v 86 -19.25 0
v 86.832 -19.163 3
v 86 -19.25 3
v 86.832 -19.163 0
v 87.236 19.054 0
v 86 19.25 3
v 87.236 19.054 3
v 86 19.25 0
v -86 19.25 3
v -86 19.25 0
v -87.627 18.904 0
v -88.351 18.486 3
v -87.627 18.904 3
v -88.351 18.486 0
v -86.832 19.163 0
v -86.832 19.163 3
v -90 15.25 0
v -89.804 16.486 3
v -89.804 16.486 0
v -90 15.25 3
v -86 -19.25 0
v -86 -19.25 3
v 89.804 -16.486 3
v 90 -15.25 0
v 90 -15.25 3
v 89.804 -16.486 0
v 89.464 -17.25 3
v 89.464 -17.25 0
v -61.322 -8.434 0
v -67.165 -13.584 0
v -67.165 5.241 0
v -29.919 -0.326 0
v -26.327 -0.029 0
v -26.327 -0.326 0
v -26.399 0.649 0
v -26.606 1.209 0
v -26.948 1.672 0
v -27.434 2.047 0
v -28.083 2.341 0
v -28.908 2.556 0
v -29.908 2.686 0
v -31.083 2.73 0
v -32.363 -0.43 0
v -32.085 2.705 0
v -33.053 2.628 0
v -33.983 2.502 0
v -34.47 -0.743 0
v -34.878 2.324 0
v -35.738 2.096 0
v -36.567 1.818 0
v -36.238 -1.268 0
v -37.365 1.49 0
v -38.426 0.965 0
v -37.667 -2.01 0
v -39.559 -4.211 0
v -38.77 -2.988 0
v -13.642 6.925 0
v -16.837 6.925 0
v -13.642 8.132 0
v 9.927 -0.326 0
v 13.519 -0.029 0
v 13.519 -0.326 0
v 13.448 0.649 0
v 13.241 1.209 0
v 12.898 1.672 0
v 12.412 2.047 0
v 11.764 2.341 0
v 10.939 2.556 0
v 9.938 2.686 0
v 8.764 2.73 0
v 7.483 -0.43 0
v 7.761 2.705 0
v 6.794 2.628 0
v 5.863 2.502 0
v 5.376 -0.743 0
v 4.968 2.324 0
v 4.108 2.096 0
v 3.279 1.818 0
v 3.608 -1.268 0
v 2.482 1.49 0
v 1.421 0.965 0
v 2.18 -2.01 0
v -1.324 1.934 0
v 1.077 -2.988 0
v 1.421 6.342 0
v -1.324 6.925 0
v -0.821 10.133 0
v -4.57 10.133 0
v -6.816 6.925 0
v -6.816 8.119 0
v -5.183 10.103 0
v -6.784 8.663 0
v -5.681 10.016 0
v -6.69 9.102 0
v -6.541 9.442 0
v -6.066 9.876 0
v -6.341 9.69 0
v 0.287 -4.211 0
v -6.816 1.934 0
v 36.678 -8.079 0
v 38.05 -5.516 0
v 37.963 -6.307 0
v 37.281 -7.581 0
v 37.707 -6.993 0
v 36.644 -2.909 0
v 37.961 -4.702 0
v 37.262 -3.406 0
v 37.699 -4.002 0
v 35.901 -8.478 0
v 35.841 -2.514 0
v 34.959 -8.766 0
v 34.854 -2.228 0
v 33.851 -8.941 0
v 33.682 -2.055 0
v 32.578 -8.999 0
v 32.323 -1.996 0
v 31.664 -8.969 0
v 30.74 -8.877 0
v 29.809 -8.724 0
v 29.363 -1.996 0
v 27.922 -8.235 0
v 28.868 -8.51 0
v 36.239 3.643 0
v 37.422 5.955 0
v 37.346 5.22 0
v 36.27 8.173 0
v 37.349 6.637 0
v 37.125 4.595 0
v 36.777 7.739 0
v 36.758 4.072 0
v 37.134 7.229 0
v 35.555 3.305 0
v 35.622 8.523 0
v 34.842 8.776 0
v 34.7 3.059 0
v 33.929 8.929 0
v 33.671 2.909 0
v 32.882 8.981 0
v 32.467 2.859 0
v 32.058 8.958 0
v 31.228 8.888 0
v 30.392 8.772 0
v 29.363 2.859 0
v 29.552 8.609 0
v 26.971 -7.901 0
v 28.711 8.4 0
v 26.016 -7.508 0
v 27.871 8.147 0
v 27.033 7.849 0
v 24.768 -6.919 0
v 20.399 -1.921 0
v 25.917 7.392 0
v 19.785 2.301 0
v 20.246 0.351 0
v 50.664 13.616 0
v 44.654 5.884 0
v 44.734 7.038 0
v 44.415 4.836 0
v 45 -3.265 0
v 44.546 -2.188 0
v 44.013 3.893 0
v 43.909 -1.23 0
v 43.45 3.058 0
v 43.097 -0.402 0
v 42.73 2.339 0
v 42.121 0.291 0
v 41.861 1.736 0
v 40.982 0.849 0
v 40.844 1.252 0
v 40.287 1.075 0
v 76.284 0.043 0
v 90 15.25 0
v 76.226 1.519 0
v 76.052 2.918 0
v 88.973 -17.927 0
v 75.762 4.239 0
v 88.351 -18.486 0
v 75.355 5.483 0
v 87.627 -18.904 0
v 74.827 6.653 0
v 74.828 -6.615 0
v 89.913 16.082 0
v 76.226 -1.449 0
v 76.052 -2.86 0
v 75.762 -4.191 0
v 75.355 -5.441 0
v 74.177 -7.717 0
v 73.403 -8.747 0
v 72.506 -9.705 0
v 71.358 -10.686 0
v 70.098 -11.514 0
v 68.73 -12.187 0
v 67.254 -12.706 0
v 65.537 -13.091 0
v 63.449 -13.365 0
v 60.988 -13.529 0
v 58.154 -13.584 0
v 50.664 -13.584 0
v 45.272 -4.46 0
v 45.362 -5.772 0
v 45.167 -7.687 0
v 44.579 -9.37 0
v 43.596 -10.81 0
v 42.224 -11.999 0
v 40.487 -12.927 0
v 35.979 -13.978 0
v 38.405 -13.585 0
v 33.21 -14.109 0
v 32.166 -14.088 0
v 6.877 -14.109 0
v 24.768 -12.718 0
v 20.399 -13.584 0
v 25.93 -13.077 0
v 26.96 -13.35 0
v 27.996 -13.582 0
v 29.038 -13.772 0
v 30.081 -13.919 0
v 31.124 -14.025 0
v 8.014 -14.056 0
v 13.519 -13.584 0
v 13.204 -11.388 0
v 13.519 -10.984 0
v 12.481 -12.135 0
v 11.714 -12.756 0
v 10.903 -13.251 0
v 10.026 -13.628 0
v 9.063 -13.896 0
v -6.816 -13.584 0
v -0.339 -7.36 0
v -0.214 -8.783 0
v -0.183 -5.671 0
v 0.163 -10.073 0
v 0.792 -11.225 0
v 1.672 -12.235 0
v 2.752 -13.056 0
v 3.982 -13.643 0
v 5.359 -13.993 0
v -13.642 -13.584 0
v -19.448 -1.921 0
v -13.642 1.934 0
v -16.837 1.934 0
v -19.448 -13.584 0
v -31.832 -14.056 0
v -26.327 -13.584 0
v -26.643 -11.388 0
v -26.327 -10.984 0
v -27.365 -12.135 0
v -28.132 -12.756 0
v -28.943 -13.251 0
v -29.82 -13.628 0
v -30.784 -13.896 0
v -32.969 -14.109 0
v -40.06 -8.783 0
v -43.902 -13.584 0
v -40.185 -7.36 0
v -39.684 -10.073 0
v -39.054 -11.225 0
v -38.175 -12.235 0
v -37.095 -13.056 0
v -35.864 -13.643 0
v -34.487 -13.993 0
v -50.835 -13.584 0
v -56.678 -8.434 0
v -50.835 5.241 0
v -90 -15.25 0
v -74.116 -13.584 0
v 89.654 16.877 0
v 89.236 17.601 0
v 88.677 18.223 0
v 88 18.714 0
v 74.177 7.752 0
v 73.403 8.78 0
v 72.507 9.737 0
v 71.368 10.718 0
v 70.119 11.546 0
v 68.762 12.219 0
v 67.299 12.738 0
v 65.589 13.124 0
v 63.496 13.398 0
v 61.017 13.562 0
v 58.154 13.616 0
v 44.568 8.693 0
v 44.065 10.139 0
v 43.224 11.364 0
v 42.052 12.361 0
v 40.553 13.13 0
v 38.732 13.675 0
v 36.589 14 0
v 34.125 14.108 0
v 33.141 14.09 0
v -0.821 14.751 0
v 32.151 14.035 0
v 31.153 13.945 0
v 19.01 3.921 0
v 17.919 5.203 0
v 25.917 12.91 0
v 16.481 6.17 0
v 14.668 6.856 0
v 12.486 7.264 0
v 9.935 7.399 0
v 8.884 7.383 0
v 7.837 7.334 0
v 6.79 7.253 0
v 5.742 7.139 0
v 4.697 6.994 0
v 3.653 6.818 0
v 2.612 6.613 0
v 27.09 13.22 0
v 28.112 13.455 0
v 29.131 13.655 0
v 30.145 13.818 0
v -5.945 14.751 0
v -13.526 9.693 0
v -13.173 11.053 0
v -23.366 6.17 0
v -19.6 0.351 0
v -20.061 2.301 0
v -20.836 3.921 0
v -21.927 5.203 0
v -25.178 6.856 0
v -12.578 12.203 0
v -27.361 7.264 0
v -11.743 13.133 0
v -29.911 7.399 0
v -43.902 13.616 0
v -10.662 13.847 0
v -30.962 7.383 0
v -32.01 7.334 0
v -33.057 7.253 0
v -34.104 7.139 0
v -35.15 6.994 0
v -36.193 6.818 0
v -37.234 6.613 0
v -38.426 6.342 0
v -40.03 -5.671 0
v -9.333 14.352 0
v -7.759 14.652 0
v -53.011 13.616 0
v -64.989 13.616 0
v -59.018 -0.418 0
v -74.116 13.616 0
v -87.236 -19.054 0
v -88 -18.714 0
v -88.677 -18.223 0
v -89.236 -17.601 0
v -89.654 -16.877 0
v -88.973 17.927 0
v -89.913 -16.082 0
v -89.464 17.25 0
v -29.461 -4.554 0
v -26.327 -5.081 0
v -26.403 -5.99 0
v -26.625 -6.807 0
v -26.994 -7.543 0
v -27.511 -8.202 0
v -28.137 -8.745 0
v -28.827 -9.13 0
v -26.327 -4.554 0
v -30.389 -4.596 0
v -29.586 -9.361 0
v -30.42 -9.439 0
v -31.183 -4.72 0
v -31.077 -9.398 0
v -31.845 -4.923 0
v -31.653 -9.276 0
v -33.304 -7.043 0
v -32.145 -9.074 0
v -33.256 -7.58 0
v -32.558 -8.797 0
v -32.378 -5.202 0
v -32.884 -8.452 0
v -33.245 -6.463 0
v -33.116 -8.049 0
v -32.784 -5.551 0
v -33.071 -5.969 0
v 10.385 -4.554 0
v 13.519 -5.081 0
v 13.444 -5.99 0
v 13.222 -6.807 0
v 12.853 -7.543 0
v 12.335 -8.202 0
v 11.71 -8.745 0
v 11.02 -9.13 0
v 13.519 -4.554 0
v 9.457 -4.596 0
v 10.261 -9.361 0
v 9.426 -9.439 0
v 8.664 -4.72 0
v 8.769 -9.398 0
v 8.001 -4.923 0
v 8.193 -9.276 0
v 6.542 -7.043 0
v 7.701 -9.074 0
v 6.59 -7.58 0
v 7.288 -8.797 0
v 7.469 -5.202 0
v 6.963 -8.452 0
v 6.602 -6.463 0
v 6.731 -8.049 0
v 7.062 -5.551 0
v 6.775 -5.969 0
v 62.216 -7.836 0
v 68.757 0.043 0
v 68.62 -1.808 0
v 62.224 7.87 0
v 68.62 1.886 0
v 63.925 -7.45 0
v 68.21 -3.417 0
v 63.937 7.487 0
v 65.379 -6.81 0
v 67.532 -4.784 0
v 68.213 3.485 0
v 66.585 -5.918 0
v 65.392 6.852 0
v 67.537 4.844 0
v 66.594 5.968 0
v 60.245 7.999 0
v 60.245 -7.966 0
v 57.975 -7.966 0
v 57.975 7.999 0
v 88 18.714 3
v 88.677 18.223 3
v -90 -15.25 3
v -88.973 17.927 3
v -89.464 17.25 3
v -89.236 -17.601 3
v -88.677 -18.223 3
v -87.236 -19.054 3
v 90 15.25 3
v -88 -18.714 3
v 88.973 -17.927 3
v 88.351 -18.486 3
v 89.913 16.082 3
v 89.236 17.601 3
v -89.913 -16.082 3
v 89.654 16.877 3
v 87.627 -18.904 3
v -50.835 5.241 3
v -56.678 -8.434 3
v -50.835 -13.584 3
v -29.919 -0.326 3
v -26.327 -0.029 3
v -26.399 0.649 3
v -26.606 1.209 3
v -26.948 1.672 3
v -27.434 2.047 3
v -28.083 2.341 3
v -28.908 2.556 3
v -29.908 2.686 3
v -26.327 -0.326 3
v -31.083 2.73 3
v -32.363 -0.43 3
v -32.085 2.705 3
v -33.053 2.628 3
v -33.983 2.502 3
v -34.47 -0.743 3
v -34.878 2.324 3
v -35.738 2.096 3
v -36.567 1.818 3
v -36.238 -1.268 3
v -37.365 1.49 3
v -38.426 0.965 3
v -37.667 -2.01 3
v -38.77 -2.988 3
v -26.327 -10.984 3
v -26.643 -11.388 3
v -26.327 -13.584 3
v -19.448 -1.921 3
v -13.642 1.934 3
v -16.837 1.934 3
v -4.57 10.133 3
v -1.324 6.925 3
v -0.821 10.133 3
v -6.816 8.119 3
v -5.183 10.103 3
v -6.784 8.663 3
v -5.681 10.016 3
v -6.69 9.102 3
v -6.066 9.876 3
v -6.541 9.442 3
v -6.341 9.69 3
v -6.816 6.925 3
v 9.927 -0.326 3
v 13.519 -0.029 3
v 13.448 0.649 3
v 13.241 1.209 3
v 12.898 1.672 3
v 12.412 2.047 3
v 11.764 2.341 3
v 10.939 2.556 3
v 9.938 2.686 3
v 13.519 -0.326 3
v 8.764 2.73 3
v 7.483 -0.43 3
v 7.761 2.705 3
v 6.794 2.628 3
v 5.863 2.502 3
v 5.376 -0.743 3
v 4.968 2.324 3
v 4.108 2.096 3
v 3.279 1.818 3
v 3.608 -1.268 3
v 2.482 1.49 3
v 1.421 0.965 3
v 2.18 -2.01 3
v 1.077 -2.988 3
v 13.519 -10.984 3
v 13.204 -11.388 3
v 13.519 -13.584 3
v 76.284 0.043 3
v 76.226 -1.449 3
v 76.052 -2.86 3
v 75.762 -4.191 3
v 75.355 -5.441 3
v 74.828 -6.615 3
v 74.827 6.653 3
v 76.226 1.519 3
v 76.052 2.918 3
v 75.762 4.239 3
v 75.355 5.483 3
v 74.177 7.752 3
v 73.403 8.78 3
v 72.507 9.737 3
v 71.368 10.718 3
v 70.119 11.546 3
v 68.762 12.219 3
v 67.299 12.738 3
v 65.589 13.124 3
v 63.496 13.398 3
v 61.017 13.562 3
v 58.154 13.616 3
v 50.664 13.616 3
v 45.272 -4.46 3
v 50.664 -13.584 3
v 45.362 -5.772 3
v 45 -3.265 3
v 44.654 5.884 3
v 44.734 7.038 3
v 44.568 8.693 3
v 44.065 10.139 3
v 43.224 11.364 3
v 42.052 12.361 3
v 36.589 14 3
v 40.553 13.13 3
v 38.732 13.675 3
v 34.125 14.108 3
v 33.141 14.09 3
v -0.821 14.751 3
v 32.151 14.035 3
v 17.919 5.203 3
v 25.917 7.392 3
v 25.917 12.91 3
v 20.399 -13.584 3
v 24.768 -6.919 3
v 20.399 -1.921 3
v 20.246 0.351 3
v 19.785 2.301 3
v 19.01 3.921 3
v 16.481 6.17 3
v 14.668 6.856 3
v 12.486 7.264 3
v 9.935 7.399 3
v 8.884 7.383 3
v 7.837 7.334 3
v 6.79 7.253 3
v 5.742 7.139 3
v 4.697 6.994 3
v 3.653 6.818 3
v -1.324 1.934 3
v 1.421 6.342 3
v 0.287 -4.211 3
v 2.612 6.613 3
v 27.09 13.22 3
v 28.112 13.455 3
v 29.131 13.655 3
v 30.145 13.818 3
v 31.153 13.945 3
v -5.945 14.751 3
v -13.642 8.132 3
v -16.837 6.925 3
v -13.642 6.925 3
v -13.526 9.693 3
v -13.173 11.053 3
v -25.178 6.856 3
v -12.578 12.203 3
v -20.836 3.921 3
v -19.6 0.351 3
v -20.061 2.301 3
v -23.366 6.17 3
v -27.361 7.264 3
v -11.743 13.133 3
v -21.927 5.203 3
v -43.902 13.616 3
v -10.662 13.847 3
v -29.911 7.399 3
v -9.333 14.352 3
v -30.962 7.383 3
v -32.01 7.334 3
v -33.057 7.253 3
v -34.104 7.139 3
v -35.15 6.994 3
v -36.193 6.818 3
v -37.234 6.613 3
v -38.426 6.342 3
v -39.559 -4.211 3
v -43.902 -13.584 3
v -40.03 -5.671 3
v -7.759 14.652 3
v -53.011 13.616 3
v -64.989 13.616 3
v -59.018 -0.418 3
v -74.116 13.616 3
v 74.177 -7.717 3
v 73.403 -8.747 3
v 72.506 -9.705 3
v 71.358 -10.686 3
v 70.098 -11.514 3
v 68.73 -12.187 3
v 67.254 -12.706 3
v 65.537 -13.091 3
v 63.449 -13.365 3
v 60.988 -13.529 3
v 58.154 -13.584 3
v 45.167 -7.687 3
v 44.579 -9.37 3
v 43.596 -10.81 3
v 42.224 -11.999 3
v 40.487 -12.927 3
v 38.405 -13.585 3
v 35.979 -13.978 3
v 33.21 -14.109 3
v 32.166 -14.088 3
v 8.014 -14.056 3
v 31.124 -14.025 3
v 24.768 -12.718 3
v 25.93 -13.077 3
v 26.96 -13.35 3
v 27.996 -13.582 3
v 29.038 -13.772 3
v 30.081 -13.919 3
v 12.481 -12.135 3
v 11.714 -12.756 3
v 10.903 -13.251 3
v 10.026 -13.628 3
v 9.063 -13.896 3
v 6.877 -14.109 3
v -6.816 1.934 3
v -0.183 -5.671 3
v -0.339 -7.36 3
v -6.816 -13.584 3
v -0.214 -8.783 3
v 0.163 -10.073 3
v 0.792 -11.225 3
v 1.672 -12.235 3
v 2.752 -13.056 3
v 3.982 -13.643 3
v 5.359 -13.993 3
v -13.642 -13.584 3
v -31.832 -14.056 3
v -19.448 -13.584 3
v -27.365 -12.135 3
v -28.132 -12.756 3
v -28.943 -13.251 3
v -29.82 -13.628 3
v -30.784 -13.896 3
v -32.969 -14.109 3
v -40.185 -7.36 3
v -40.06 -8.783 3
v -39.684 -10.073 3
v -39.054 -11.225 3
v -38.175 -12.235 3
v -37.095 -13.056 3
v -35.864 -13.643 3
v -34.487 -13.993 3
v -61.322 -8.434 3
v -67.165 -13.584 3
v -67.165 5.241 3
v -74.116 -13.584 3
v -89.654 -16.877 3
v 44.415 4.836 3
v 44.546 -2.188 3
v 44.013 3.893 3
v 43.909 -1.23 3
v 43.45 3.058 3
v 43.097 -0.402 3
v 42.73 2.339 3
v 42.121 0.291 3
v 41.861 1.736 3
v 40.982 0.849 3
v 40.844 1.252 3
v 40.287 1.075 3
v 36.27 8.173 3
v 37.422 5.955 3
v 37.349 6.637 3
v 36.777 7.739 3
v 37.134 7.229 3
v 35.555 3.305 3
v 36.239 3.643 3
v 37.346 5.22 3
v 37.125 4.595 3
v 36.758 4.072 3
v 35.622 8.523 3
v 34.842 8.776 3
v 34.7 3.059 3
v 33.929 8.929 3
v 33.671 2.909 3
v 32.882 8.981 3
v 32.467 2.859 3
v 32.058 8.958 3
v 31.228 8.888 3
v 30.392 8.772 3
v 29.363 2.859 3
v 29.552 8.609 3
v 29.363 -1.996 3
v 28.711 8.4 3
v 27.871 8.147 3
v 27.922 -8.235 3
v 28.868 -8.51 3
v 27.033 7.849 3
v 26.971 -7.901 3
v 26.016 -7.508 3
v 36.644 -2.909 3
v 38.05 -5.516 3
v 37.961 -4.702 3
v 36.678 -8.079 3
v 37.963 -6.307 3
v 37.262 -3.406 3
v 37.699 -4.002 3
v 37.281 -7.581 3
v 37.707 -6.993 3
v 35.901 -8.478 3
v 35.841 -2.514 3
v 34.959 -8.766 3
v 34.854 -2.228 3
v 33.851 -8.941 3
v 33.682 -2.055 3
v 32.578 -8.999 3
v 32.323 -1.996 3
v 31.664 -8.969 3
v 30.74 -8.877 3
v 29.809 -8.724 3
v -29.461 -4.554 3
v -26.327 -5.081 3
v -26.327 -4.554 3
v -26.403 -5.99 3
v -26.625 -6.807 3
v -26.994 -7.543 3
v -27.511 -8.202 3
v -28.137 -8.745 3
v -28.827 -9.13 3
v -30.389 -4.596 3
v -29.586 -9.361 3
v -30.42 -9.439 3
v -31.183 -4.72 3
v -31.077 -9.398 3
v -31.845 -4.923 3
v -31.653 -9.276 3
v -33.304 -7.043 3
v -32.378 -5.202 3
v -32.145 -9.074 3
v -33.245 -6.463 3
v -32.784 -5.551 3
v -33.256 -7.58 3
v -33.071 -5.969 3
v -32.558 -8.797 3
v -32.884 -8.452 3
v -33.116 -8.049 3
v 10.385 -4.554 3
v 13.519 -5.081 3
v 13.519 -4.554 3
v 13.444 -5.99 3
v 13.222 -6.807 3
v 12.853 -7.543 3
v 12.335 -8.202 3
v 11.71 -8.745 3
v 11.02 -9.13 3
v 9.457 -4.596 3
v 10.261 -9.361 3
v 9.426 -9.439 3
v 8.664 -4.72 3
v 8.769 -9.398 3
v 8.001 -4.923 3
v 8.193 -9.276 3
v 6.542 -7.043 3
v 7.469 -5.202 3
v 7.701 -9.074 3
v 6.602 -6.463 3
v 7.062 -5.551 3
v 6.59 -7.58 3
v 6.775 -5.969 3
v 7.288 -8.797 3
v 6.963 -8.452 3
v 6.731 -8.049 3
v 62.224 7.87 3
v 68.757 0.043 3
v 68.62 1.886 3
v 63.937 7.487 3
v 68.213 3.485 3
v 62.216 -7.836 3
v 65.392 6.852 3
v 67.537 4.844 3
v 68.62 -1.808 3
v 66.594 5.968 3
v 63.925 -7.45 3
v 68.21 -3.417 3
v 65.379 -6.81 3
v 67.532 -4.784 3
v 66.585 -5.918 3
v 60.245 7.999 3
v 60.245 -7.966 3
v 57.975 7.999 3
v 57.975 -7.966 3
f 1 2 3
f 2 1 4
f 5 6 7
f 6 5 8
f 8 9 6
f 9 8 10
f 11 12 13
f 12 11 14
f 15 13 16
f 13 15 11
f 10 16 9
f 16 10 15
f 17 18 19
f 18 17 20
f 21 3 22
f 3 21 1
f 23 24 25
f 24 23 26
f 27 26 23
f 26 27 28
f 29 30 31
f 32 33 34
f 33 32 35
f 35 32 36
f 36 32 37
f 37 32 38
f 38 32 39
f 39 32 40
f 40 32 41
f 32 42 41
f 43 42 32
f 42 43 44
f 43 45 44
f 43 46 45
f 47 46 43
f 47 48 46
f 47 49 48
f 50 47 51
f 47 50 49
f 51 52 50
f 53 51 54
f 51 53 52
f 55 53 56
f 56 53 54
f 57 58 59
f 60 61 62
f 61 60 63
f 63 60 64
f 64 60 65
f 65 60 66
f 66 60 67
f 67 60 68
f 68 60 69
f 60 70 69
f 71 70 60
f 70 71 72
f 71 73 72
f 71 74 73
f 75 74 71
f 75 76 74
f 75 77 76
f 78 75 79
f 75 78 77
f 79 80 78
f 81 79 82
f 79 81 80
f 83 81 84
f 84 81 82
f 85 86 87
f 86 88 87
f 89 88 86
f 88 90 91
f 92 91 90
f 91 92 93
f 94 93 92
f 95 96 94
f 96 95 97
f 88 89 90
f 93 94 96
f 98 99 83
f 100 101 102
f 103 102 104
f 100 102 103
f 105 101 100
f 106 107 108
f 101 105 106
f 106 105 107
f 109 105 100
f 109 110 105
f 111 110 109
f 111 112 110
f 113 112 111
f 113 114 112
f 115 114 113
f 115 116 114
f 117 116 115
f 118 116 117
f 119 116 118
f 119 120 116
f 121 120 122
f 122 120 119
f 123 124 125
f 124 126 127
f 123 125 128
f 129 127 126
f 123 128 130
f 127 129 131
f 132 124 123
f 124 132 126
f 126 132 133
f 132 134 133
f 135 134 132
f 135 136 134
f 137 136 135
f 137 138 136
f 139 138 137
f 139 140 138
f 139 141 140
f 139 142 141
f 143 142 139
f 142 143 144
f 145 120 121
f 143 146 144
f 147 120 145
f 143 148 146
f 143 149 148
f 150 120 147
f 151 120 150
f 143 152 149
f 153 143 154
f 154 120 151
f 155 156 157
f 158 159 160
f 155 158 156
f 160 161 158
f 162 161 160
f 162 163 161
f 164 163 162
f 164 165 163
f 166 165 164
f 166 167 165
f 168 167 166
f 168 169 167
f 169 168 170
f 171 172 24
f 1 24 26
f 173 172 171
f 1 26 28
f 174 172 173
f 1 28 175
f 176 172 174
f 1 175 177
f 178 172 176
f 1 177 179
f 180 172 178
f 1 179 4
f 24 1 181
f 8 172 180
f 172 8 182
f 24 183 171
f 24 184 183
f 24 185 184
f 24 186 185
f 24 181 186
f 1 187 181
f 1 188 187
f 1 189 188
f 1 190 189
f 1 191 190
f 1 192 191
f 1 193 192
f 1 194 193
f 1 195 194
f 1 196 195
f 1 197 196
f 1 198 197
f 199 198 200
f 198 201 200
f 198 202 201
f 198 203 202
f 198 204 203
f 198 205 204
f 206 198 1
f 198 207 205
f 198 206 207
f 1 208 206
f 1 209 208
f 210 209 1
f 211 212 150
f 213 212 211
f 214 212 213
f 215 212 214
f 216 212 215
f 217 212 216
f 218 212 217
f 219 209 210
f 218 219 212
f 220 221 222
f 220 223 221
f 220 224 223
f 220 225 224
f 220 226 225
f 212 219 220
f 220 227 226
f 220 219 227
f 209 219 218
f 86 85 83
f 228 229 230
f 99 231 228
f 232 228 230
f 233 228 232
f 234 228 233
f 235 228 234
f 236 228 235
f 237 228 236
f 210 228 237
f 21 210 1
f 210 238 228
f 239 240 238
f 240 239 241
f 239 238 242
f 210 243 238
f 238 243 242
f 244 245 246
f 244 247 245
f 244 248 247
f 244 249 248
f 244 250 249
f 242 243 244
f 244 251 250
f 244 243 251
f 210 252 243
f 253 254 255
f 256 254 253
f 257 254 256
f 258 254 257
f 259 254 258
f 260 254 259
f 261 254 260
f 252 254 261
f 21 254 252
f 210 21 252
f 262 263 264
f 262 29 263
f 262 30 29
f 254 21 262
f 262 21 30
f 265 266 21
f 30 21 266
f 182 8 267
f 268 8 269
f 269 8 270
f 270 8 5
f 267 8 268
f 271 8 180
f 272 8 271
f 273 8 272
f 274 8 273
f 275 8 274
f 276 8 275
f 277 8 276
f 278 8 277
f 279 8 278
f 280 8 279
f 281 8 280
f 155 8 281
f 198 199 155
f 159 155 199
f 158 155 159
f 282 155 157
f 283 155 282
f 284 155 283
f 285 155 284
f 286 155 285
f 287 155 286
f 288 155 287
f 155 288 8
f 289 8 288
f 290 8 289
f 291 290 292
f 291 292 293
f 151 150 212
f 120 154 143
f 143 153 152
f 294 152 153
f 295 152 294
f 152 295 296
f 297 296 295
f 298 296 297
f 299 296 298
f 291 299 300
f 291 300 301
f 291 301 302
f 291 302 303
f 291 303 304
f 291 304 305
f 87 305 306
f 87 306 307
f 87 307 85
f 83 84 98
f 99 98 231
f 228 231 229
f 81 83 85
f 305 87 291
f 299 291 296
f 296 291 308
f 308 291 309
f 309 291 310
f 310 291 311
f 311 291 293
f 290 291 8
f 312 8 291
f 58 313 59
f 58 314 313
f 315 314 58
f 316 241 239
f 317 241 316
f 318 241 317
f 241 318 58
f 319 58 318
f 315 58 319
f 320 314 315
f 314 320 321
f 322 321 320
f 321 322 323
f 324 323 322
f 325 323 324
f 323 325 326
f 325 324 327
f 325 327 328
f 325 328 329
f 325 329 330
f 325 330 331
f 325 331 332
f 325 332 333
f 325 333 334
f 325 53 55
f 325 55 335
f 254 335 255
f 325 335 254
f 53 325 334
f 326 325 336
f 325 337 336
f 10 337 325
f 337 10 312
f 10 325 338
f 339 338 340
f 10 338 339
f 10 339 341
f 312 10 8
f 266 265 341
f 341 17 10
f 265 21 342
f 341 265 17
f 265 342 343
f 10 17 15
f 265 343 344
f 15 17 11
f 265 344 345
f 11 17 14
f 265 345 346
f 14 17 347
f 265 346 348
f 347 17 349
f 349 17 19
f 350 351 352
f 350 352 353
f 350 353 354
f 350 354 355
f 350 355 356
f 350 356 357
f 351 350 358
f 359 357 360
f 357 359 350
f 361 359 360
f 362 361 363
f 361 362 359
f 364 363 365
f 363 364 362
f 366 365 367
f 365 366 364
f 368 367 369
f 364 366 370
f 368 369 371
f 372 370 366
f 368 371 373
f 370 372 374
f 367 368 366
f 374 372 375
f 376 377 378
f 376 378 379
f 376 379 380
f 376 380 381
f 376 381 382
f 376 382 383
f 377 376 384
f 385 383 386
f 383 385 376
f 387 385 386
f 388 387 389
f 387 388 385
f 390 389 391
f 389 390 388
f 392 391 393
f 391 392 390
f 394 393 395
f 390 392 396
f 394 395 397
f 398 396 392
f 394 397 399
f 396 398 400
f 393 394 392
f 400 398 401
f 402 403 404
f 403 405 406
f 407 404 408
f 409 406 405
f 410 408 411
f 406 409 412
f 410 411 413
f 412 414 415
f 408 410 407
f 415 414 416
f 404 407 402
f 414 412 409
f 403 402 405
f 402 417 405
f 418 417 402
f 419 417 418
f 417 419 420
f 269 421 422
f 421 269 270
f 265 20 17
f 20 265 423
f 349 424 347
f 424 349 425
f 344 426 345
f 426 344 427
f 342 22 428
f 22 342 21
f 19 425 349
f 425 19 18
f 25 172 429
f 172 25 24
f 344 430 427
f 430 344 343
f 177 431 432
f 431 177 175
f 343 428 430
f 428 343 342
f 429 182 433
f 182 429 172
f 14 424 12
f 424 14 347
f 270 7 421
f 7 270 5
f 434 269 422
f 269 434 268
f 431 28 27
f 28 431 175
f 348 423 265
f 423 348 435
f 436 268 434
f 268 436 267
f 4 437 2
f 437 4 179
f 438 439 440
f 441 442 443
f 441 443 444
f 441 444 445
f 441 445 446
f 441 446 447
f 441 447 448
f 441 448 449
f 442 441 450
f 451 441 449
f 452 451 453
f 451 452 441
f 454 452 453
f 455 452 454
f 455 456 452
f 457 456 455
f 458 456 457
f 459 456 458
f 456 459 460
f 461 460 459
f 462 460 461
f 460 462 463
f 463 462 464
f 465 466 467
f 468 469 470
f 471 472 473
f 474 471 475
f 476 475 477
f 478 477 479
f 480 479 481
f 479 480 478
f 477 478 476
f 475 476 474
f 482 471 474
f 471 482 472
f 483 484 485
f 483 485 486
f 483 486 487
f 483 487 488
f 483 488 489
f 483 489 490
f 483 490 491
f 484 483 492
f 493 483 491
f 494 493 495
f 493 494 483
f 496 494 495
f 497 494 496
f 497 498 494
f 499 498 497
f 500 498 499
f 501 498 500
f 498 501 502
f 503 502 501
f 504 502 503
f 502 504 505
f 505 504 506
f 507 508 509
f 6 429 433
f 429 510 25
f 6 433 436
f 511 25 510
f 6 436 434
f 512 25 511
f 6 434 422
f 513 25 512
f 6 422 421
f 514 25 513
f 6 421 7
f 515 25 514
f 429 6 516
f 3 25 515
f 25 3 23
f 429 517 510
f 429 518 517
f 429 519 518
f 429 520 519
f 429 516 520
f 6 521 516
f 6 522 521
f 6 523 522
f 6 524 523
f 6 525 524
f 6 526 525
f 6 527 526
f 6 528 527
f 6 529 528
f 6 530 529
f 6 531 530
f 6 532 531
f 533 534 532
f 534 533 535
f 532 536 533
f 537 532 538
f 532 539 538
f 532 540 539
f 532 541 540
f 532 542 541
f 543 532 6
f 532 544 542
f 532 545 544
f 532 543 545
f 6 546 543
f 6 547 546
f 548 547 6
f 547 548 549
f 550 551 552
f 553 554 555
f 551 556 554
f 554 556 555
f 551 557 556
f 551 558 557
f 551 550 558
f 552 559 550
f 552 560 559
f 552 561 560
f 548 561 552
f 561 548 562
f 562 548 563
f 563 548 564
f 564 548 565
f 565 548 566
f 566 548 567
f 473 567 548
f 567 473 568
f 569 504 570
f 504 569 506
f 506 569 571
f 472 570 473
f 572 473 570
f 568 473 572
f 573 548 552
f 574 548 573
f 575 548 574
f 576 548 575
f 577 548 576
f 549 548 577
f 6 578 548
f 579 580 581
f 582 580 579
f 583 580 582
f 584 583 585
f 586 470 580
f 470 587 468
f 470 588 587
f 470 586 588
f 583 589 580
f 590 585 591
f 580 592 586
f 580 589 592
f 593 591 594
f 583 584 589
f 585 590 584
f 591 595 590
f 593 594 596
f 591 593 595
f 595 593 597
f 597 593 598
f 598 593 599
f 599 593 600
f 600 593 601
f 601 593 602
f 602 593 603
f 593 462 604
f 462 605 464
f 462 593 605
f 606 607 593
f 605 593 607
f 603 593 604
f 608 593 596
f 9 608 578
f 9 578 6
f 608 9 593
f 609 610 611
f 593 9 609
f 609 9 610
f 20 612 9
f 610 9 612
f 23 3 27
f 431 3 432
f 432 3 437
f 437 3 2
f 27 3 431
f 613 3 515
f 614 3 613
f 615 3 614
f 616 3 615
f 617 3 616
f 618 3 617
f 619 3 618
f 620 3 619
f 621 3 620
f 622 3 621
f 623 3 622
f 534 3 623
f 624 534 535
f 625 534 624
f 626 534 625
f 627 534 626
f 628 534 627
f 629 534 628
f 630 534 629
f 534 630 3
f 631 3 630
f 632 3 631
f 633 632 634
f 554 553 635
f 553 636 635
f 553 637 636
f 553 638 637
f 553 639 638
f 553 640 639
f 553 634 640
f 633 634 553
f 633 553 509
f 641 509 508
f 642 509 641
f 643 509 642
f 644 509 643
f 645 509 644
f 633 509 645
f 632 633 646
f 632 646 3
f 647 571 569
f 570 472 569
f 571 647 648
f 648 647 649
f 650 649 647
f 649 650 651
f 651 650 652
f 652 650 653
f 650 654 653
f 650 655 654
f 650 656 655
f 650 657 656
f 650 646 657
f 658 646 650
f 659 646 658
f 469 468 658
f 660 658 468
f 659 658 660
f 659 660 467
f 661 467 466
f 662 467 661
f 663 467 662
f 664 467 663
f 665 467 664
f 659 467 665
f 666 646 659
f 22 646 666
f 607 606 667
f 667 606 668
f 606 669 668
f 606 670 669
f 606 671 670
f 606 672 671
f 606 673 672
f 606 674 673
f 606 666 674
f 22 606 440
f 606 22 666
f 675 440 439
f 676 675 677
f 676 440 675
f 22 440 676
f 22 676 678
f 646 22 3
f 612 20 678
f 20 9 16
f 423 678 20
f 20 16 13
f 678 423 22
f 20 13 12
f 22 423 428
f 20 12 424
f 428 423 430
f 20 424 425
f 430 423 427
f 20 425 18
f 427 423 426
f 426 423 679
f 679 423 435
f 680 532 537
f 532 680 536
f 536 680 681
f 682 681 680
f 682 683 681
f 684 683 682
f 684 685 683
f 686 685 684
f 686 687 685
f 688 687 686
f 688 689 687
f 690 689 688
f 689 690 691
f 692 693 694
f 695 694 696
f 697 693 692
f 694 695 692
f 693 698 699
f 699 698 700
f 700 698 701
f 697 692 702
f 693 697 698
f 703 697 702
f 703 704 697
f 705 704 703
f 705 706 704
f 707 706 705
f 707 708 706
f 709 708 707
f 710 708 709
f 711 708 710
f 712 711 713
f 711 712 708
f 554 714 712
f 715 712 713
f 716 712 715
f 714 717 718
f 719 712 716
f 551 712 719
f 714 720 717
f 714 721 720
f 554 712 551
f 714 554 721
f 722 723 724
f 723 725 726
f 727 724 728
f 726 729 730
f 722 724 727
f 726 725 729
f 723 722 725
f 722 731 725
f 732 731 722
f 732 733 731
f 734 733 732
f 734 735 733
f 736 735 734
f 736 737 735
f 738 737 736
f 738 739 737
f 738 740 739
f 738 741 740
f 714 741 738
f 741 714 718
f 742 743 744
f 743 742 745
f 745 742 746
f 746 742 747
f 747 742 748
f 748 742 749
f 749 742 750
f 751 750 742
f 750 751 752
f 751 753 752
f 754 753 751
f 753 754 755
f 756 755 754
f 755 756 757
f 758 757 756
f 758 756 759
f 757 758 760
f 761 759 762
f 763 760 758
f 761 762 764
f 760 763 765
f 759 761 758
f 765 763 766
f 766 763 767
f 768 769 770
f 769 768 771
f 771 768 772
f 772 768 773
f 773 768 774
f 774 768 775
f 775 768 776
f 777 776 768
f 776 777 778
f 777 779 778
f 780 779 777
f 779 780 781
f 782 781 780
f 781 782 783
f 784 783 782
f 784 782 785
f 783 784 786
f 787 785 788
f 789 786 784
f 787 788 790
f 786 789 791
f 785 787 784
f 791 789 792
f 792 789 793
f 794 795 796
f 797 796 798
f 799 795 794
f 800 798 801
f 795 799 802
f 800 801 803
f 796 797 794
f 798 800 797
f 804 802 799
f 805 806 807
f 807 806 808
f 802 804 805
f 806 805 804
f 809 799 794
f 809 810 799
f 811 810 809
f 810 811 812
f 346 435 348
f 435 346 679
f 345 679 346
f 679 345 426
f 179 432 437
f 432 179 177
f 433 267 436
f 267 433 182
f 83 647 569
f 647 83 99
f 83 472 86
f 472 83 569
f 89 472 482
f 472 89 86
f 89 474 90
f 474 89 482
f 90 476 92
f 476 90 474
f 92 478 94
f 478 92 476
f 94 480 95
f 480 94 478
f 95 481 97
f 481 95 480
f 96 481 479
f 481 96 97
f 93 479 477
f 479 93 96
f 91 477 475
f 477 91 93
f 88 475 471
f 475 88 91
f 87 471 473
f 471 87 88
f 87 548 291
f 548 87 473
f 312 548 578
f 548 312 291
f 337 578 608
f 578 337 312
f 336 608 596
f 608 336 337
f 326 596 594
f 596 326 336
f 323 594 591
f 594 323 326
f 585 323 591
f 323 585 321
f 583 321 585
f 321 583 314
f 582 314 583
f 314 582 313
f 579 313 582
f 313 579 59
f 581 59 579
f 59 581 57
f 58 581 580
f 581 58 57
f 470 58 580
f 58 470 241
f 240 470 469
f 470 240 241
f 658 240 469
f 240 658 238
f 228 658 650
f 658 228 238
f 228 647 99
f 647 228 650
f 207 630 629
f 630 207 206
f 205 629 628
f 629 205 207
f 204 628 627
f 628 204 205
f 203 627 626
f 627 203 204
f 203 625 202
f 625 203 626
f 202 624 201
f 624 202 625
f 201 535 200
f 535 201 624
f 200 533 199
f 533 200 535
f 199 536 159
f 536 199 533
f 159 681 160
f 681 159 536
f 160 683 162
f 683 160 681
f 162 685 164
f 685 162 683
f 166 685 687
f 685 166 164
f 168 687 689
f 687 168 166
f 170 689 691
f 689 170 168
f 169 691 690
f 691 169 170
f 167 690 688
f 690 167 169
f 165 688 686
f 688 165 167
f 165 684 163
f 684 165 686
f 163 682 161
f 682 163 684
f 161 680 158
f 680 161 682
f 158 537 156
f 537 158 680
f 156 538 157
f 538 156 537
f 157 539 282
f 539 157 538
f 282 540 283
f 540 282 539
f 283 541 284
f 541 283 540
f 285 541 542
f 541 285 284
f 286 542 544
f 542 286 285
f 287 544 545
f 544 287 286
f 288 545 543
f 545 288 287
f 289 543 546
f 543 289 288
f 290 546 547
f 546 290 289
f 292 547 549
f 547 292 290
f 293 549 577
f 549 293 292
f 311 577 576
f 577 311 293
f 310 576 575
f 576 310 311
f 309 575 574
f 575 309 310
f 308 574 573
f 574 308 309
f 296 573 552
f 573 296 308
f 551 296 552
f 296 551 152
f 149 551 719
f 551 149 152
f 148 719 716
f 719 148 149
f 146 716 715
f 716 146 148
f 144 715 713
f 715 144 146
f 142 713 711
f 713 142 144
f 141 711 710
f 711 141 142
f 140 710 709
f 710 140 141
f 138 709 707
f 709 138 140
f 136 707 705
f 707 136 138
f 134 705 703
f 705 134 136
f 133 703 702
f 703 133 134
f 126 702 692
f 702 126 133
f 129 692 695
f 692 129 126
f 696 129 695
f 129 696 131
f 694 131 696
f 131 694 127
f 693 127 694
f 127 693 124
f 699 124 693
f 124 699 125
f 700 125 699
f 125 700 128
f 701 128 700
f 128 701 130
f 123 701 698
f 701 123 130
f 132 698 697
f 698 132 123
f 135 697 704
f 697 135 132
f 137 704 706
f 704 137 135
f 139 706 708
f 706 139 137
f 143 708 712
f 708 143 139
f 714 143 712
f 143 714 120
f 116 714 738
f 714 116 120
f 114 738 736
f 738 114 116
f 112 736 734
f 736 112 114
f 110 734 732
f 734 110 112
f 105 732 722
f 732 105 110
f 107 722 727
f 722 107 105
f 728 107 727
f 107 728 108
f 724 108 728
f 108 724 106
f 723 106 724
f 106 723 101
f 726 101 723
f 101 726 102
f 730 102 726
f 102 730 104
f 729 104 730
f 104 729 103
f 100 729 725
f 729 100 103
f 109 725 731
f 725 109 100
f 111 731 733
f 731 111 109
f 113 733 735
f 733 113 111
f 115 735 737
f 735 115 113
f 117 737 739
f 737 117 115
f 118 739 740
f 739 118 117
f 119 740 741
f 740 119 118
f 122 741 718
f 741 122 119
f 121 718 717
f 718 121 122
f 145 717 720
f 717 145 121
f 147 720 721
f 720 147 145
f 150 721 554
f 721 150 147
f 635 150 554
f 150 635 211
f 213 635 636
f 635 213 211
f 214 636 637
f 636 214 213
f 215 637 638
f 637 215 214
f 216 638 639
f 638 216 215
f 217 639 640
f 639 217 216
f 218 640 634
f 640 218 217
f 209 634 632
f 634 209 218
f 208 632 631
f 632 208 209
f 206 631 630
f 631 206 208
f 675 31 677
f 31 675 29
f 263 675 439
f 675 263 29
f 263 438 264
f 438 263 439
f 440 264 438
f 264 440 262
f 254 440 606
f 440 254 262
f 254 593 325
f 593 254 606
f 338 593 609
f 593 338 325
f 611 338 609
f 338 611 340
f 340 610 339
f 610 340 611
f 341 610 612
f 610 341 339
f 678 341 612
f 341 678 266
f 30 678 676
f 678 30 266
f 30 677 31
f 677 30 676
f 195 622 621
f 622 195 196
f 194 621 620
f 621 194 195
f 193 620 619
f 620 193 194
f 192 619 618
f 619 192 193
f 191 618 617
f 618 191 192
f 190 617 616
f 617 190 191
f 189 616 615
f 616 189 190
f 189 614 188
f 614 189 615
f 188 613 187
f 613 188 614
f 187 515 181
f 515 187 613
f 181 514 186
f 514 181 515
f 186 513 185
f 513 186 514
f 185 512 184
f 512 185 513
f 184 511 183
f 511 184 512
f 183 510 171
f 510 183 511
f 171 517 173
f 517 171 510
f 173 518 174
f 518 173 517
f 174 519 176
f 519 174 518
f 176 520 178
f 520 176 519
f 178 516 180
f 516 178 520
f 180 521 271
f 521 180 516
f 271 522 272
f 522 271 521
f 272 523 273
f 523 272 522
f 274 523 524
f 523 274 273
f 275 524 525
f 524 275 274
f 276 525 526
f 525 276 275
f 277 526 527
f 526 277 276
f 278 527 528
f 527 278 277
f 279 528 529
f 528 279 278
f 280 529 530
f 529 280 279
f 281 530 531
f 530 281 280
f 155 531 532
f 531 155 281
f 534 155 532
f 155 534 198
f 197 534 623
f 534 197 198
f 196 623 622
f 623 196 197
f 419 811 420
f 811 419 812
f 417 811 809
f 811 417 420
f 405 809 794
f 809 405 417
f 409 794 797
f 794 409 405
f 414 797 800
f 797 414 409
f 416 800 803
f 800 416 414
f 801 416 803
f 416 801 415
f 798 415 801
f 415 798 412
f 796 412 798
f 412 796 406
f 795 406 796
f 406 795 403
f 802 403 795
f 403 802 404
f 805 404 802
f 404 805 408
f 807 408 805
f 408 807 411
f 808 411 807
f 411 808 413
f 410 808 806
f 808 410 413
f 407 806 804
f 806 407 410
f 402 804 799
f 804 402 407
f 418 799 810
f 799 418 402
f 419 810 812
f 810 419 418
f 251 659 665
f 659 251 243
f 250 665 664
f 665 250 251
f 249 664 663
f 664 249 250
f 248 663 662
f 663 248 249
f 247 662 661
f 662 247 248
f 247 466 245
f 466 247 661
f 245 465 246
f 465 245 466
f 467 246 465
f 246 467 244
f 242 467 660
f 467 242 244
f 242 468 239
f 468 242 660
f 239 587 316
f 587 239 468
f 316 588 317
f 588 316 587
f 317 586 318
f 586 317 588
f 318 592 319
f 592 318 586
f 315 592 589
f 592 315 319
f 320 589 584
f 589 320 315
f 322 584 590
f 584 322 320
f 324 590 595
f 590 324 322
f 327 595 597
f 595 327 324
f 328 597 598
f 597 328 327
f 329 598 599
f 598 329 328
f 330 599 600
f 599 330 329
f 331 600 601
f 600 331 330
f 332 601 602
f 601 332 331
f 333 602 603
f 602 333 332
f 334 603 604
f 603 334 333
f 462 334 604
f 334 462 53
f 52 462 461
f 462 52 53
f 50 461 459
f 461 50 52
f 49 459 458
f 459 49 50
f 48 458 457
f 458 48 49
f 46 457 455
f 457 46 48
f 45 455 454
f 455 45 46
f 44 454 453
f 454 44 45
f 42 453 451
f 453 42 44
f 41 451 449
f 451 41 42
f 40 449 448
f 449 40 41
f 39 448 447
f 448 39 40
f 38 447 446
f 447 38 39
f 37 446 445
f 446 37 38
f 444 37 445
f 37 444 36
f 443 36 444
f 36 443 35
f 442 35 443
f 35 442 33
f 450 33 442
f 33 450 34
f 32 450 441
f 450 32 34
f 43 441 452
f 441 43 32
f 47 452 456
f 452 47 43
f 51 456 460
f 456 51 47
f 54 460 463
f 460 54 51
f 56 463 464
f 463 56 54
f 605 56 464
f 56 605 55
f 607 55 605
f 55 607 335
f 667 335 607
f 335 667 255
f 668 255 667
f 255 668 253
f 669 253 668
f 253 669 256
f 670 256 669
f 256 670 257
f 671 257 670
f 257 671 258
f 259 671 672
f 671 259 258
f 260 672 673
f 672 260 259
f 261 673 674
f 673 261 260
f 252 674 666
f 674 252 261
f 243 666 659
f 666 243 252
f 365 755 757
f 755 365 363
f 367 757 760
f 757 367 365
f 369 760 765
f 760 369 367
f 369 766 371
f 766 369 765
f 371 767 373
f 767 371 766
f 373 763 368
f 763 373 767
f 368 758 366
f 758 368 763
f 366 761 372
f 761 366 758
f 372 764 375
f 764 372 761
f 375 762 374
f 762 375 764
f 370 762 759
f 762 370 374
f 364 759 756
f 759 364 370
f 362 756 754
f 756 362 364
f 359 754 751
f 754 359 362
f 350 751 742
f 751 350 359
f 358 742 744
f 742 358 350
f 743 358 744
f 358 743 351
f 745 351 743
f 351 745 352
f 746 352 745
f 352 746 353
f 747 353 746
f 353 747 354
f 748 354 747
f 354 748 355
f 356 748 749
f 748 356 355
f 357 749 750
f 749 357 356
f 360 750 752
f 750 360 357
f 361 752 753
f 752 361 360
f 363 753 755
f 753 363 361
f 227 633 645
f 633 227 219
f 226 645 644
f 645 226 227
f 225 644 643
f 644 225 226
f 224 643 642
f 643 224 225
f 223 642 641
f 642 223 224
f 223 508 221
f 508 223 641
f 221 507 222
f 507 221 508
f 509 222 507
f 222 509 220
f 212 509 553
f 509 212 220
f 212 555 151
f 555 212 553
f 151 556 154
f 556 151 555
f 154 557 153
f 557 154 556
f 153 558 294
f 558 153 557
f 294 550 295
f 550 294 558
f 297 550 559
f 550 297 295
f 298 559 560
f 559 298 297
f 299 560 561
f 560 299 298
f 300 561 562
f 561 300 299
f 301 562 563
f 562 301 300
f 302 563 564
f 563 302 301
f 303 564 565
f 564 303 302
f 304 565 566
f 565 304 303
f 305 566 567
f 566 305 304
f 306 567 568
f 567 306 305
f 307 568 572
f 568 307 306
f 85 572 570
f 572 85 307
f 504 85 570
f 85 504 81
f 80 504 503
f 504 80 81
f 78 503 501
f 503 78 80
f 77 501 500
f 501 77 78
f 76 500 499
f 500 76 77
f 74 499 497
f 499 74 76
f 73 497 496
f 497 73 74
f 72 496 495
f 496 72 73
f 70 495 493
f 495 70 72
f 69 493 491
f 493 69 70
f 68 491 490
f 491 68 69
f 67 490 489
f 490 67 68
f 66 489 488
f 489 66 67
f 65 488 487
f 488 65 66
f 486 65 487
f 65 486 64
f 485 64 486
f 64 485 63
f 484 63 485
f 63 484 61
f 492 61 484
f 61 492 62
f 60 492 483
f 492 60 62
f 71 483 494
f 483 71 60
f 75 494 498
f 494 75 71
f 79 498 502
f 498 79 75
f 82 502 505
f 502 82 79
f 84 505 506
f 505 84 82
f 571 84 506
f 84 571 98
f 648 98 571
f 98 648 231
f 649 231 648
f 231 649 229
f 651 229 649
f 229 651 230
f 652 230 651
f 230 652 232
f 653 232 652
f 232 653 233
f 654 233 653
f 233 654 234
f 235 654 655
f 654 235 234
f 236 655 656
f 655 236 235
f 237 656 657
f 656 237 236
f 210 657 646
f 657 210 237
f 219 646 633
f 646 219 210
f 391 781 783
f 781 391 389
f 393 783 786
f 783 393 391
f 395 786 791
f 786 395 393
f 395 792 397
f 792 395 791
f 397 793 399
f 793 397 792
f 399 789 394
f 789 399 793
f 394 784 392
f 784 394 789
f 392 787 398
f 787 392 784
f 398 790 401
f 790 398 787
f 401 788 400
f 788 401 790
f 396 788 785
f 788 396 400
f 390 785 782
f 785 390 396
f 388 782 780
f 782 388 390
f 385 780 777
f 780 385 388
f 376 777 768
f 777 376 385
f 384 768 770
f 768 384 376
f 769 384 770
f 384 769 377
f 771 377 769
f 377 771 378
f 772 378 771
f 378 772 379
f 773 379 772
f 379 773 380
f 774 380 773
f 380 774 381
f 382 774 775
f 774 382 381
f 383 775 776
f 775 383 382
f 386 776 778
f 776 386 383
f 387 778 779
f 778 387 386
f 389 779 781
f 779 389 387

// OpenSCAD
// Word Sign - 3 Layers
// Parametric word sign with 3 color layers (Base, Middle, Top)
// Parameters are injected by the renderer

// --- Parameters ---
Text        = "Mafa3D";
Font        = "Bebas Neue";
Target_Size = 150;     // mm - target text width
Base_Width  = 180;     // mm - base plate width
Offset      = 2;       // mm - layer offset
Tolerance   = 0.2;     // mm - fit tolerance
Base_Height = 3;       // mm - base plate height
Layer_Height = 4;      // mm - height per color layer
Part        = "Base";  // "Base" | "Middle" | "Top"

// --- Constants ---
$fn = 30;
padding = 8;           // padding around text on base plate

// --- Computed ---
base_depth = Base_Height;
text_h     = Layer_Height;
mid_h      = Layer_Height;
top_h      = Layer_Height;

// Estimated base height from bounding box
base_h = max(
  text_h * 0.6,
  Target_Size * 0.15
);

// Base plate dimensions
bw = Base_Width;
bd = base_h + padding * 2;

// --- Modules ---

module text_shape(txt, size, fnt) {
  resize([Target_Size, 0, 0], auto=true)
  text(txt, size=size, font=fnt, halign="center", valign="center");
}

module base_plate() {
  // Rounded rectangle base
  offset(r=4) offset(-4)
  square([bw, bd], center=true);
}

module base_part() {
  difference() {
    // Base plate
    linear_extrude(base_depth)
    base_plate();

    // Pocket for middle layer
    translate([0, 0, base_depth - text_h + Tolerance])
    linear_extrude(text_h + 1)
    offset(delta=Tolerance)
    text_shape(Text, 40, str(Font, ":style=Bold"));
  }
}

module middle_part() {
  difference() {
    // Offset shell
    linear_extrude(mid_h)
    offset(delta=Offset)
    text_shape(Text, 40, str(Font, ":style=Bold"));

    // Pocket for top layer
    translate([0, 0, mid_h - top_h + Tolerance])
    linear_extrude(top_h + 1)
    offset(delta=Tolerance)
    text_shape(Text, 40, str(Font, ":style=Bold"));
  }
}

module top_part() {
  linear_extrude(top_h)
  text_shape(Text, 40, str(Font, ":style=Bold"));
}

// --- Render ---
if (Part == "Base") {
  base_part();
} else if (Part == "Middle") {
  translate([0, 0, base_depth])
  middle_part();
} else if (Part == "Top") {
  translate([0, 0, base_depth + mid_h])
  top_part();
}
